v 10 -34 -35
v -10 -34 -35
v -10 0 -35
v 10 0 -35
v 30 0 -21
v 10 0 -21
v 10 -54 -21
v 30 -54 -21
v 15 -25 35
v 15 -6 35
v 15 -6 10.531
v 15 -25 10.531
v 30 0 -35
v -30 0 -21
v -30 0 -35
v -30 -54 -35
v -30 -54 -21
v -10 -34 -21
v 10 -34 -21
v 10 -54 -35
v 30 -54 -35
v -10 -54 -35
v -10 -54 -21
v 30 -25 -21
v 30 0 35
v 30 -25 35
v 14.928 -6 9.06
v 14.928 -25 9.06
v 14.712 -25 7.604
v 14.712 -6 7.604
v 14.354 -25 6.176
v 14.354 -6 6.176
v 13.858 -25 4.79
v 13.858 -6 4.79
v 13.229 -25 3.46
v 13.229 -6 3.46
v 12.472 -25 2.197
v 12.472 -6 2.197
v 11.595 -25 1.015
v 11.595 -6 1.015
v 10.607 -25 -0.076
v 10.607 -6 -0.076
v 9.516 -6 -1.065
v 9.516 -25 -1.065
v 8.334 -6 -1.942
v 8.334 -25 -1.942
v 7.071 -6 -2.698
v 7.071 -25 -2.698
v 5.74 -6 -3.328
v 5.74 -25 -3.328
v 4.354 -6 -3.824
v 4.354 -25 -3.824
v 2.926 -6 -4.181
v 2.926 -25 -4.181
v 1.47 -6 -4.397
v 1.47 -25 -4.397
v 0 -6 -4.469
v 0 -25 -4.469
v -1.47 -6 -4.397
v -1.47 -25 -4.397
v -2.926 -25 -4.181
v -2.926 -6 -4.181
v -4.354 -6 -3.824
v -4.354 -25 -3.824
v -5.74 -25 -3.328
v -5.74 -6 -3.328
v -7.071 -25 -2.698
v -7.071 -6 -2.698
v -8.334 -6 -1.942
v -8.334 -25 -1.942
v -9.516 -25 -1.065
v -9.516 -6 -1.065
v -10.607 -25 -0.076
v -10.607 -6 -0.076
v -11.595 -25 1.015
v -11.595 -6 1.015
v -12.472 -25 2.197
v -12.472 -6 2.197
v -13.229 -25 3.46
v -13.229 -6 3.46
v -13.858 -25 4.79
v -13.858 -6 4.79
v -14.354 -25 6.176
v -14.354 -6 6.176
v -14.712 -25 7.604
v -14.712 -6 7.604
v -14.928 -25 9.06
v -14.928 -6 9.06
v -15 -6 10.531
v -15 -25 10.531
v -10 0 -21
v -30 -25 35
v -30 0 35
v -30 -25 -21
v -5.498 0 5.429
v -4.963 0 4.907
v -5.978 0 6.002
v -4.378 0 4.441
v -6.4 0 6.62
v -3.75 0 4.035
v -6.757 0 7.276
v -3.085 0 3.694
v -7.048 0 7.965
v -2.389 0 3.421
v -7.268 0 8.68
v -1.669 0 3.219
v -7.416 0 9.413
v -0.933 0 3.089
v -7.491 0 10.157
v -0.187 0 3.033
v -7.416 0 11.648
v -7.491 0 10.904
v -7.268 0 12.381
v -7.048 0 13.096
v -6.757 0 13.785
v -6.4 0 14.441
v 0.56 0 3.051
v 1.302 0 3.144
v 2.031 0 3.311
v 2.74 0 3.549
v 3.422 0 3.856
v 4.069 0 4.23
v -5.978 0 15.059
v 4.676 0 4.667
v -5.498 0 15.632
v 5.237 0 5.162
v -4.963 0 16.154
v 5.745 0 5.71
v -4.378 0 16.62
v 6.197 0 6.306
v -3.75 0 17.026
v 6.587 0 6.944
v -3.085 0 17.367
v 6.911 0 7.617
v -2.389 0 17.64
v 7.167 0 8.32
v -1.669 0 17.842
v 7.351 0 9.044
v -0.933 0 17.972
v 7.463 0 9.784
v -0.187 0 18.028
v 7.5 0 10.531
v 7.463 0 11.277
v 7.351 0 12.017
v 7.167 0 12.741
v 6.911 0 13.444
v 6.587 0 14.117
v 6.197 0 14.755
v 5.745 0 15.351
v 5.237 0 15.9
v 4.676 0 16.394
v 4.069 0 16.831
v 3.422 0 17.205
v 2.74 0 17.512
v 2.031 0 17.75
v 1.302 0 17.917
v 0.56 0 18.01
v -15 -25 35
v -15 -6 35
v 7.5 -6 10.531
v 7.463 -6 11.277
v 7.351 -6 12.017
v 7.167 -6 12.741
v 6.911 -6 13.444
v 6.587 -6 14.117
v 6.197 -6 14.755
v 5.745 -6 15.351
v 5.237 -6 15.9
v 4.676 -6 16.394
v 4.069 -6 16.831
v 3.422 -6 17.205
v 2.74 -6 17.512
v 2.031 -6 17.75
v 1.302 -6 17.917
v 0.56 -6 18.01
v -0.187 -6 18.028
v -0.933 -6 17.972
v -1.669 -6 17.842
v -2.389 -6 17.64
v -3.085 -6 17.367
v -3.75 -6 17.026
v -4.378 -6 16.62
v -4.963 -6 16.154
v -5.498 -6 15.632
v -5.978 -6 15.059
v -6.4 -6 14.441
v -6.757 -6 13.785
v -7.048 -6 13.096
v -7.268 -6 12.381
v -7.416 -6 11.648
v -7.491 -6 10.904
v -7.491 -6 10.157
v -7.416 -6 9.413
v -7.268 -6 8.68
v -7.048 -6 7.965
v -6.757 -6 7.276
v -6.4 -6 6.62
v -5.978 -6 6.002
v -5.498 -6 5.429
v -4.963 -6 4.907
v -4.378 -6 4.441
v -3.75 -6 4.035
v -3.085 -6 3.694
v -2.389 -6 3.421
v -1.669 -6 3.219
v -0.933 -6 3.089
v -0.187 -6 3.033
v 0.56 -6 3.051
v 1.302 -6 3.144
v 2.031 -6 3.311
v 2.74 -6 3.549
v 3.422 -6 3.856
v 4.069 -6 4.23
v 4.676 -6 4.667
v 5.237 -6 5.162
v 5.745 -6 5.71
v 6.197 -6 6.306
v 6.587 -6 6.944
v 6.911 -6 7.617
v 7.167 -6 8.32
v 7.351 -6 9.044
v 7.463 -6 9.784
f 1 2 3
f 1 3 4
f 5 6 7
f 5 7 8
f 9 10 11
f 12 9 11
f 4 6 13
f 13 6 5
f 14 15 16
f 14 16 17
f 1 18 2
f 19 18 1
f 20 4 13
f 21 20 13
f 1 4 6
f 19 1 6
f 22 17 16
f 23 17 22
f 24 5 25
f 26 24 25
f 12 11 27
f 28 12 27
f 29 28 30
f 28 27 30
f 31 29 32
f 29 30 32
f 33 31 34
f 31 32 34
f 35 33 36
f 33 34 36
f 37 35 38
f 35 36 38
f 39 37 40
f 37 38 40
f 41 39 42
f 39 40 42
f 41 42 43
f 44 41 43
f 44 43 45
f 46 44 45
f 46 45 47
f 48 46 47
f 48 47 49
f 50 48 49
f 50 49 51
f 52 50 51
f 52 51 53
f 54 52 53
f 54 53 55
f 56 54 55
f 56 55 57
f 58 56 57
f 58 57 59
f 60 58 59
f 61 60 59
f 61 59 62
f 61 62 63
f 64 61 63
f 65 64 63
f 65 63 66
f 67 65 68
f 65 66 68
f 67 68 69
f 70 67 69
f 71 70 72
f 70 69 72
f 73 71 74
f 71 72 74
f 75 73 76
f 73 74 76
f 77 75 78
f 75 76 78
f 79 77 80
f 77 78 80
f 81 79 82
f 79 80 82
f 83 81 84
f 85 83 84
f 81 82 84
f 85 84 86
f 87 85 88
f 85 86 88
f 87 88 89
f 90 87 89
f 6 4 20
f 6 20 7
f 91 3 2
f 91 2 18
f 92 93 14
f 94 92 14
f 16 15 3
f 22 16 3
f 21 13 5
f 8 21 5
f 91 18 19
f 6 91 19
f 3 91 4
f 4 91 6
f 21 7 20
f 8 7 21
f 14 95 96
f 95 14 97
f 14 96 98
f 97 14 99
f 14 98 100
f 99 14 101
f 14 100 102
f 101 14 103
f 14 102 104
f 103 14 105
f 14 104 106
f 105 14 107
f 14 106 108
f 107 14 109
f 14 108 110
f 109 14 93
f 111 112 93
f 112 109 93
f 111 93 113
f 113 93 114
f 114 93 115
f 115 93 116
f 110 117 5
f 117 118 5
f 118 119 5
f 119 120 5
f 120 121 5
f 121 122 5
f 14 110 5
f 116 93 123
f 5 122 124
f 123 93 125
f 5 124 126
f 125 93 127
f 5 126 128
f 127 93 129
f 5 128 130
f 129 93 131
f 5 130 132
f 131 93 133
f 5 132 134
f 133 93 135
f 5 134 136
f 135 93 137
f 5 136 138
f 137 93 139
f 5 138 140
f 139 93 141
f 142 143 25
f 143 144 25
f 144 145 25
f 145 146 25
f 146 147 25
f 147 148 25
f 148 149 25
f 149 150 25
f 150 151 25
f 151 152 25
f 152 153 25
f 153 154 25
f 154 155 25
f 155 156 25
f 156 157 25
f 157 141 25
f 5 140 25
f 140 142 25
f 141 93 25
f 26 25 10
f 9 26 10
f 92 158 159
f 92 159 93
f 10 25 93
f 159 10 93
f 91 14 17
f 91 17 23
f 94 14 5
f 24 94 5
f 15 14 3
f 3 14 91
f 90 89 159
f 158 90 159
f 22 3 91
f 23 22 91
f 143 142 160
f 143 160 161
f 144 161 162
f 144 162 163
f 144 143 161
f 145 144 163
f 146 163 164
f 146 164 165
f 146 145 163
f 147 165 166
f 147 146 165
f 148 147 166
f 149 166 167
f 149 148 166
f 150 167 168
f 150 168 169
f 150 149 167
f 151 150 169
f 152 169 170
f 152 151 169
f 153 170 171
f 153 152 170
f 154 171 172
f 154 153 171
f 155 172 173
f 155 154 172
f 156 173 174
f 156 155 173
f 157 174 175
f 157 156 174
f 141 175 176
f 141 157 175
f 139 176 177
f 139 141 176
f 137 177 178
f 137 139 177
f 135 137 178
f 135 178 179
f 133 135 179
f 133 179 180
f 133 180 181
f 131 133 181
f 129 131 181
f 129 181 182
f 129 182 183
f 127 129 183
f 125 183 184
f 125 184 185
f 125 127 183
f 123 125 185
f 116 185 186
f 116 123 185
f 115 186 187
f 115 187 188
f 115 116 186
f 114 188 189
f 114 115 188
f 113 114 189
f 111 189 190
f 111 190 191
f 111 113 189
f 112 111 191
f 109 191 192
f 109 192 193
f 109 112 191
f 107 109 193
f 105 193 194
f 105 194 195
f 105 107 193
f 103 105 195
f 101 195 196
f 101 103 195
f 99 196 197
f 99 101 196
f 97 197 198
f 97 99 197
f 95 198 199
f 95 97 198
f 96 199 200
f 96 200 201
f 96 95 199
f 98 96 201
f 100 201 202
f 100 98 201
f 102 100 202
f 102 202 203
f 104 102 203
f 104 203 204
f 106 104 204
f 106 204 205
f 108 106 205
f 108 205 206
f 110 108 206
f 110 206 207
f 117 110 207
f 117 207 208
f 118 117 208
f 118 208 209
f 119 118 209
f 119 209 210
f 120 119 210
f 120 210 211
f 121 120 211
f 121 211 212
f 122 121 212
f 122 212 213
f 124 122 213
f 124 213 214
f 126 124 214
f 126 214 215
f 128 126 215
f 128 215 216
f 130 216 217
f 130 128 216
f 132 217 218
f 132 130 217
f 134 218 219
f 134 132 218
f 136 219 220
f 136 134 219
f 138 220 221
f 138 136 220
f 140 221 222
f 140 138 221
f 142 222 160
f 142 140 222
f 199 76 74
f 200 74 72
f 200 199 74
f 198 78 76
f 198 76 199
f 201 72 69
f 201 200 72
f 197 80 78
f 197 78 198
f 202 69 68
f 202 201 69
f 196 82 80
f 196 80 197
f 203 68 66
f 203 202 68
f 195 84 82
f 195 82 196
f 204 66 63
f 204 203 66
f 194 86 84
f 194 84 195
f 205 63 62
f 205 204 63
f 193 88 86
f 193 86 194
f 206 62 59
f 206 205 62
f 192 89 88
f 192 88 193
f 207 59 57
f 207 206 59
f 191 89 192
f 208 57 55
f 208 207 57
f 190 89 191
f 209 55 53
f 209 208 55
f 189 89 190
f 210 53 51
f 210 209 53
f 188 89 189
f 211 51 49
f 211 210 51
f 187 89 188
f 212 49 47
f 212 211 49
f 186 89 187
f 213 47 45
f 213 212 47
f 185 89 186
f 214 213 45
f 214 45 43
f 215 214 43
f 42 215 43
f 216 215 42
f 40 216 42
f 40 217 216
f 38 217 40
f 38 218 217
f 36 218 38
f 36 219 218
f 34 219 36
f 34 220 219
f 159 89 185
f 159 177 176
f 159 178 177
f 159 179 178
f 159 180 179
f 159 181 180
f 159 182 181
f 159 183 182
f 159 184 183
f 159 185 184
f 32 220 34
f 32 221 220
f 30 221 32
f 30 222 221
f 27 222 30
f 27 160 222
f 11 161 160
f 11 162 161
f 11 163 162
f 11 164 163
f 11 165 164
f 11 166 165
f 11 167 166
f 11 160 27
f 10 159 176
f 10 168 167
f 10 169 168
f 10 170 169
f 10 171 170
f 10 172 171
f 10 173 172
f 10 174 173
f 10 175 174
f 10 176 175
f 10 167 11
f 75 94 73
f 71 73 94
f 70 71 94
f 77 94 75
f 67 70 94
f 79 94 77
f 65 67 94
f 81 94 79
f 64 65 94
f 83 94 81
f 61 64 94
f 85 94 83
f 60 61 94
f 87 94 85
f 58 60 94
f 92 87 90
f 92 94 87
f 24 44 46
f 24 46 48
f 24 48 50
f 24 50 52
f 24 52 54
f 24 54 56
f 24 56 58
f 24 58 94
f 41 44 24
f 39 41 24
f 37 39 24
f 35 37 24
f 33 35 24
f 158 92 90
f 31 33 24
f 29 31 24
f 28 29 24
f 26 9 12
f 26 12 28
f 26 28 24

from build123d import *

# Parameters (mm, degrees)
F0_W     = 20
F0_H     = 14
F1_DEPTH = 54
F2_DEPTH = 34
F3_DEPTH = 25
F0_R     = 7.5
F4_DEPTH = 6


with BuildPart() as f1:
    # F0 (on Front) → F1 (new body)
    with BuildSketch(Plane.XZ):
        with Locations((20, -28)):
            Rectangle(F0_W, F0_H)
        with Locations((-20, -28)):
            Rectangle(F0_W, F0_H)
    extrude(amount=F1_DEPTH)


with BuildPart() as f2:
    # F0 (on Front) → F2 (new body)
    with BuildSketch(Plane.XZ):
        with Locations((0, -28)):
            Rectangle(F0_W, F0_H)
    extrude(amount=F2_DEPTH)


with BuildPart() as f3:
    # F0 (on Front) → F3 (new body)
    with BuildSketch(Plane.XZ):
        with BuildLine():
            Line((-30, 35), (-30, -21))
            Line((-30, -21), (-10, -21))
            Line((-10, -21), (10, -21))
            Line((10, -21), (30, -21))
            Line((30, -21), (30, 35))
            Line((30, 35), (15, 35))
            Line((15, 35), (15, 10.530524))
            ThreePointArc((15, 10.530524), (0, -4.469476), (-15, 10.530524))
            Line((-15, 10.530524), (-15, 35))
            Line((-15, 35), (-30, 35))
        make_face()
    extrude(amount=F3_DEPTH)

    # F0 (on Front) → F4 (join)
    with BuildSketch(Plane.XZ):
        with BuildLine():
            Line((15, 35), (-15, 35))
            Line((-15, 35), (-15, 10.530524))
            ThreePointArc((-15, 10.530524), (0, -4.469476), (15, 10.530524))
            Line((15, 10.530524), (15, 35))
        make_face()
        with Locations((0, 10.530524)):
            Circle(F0_R, mode=Mode.SUBTRACT)
    extrude(amount=F4_DEPTH)


solid = Compound([f1.part, f2.part, f3.part])
